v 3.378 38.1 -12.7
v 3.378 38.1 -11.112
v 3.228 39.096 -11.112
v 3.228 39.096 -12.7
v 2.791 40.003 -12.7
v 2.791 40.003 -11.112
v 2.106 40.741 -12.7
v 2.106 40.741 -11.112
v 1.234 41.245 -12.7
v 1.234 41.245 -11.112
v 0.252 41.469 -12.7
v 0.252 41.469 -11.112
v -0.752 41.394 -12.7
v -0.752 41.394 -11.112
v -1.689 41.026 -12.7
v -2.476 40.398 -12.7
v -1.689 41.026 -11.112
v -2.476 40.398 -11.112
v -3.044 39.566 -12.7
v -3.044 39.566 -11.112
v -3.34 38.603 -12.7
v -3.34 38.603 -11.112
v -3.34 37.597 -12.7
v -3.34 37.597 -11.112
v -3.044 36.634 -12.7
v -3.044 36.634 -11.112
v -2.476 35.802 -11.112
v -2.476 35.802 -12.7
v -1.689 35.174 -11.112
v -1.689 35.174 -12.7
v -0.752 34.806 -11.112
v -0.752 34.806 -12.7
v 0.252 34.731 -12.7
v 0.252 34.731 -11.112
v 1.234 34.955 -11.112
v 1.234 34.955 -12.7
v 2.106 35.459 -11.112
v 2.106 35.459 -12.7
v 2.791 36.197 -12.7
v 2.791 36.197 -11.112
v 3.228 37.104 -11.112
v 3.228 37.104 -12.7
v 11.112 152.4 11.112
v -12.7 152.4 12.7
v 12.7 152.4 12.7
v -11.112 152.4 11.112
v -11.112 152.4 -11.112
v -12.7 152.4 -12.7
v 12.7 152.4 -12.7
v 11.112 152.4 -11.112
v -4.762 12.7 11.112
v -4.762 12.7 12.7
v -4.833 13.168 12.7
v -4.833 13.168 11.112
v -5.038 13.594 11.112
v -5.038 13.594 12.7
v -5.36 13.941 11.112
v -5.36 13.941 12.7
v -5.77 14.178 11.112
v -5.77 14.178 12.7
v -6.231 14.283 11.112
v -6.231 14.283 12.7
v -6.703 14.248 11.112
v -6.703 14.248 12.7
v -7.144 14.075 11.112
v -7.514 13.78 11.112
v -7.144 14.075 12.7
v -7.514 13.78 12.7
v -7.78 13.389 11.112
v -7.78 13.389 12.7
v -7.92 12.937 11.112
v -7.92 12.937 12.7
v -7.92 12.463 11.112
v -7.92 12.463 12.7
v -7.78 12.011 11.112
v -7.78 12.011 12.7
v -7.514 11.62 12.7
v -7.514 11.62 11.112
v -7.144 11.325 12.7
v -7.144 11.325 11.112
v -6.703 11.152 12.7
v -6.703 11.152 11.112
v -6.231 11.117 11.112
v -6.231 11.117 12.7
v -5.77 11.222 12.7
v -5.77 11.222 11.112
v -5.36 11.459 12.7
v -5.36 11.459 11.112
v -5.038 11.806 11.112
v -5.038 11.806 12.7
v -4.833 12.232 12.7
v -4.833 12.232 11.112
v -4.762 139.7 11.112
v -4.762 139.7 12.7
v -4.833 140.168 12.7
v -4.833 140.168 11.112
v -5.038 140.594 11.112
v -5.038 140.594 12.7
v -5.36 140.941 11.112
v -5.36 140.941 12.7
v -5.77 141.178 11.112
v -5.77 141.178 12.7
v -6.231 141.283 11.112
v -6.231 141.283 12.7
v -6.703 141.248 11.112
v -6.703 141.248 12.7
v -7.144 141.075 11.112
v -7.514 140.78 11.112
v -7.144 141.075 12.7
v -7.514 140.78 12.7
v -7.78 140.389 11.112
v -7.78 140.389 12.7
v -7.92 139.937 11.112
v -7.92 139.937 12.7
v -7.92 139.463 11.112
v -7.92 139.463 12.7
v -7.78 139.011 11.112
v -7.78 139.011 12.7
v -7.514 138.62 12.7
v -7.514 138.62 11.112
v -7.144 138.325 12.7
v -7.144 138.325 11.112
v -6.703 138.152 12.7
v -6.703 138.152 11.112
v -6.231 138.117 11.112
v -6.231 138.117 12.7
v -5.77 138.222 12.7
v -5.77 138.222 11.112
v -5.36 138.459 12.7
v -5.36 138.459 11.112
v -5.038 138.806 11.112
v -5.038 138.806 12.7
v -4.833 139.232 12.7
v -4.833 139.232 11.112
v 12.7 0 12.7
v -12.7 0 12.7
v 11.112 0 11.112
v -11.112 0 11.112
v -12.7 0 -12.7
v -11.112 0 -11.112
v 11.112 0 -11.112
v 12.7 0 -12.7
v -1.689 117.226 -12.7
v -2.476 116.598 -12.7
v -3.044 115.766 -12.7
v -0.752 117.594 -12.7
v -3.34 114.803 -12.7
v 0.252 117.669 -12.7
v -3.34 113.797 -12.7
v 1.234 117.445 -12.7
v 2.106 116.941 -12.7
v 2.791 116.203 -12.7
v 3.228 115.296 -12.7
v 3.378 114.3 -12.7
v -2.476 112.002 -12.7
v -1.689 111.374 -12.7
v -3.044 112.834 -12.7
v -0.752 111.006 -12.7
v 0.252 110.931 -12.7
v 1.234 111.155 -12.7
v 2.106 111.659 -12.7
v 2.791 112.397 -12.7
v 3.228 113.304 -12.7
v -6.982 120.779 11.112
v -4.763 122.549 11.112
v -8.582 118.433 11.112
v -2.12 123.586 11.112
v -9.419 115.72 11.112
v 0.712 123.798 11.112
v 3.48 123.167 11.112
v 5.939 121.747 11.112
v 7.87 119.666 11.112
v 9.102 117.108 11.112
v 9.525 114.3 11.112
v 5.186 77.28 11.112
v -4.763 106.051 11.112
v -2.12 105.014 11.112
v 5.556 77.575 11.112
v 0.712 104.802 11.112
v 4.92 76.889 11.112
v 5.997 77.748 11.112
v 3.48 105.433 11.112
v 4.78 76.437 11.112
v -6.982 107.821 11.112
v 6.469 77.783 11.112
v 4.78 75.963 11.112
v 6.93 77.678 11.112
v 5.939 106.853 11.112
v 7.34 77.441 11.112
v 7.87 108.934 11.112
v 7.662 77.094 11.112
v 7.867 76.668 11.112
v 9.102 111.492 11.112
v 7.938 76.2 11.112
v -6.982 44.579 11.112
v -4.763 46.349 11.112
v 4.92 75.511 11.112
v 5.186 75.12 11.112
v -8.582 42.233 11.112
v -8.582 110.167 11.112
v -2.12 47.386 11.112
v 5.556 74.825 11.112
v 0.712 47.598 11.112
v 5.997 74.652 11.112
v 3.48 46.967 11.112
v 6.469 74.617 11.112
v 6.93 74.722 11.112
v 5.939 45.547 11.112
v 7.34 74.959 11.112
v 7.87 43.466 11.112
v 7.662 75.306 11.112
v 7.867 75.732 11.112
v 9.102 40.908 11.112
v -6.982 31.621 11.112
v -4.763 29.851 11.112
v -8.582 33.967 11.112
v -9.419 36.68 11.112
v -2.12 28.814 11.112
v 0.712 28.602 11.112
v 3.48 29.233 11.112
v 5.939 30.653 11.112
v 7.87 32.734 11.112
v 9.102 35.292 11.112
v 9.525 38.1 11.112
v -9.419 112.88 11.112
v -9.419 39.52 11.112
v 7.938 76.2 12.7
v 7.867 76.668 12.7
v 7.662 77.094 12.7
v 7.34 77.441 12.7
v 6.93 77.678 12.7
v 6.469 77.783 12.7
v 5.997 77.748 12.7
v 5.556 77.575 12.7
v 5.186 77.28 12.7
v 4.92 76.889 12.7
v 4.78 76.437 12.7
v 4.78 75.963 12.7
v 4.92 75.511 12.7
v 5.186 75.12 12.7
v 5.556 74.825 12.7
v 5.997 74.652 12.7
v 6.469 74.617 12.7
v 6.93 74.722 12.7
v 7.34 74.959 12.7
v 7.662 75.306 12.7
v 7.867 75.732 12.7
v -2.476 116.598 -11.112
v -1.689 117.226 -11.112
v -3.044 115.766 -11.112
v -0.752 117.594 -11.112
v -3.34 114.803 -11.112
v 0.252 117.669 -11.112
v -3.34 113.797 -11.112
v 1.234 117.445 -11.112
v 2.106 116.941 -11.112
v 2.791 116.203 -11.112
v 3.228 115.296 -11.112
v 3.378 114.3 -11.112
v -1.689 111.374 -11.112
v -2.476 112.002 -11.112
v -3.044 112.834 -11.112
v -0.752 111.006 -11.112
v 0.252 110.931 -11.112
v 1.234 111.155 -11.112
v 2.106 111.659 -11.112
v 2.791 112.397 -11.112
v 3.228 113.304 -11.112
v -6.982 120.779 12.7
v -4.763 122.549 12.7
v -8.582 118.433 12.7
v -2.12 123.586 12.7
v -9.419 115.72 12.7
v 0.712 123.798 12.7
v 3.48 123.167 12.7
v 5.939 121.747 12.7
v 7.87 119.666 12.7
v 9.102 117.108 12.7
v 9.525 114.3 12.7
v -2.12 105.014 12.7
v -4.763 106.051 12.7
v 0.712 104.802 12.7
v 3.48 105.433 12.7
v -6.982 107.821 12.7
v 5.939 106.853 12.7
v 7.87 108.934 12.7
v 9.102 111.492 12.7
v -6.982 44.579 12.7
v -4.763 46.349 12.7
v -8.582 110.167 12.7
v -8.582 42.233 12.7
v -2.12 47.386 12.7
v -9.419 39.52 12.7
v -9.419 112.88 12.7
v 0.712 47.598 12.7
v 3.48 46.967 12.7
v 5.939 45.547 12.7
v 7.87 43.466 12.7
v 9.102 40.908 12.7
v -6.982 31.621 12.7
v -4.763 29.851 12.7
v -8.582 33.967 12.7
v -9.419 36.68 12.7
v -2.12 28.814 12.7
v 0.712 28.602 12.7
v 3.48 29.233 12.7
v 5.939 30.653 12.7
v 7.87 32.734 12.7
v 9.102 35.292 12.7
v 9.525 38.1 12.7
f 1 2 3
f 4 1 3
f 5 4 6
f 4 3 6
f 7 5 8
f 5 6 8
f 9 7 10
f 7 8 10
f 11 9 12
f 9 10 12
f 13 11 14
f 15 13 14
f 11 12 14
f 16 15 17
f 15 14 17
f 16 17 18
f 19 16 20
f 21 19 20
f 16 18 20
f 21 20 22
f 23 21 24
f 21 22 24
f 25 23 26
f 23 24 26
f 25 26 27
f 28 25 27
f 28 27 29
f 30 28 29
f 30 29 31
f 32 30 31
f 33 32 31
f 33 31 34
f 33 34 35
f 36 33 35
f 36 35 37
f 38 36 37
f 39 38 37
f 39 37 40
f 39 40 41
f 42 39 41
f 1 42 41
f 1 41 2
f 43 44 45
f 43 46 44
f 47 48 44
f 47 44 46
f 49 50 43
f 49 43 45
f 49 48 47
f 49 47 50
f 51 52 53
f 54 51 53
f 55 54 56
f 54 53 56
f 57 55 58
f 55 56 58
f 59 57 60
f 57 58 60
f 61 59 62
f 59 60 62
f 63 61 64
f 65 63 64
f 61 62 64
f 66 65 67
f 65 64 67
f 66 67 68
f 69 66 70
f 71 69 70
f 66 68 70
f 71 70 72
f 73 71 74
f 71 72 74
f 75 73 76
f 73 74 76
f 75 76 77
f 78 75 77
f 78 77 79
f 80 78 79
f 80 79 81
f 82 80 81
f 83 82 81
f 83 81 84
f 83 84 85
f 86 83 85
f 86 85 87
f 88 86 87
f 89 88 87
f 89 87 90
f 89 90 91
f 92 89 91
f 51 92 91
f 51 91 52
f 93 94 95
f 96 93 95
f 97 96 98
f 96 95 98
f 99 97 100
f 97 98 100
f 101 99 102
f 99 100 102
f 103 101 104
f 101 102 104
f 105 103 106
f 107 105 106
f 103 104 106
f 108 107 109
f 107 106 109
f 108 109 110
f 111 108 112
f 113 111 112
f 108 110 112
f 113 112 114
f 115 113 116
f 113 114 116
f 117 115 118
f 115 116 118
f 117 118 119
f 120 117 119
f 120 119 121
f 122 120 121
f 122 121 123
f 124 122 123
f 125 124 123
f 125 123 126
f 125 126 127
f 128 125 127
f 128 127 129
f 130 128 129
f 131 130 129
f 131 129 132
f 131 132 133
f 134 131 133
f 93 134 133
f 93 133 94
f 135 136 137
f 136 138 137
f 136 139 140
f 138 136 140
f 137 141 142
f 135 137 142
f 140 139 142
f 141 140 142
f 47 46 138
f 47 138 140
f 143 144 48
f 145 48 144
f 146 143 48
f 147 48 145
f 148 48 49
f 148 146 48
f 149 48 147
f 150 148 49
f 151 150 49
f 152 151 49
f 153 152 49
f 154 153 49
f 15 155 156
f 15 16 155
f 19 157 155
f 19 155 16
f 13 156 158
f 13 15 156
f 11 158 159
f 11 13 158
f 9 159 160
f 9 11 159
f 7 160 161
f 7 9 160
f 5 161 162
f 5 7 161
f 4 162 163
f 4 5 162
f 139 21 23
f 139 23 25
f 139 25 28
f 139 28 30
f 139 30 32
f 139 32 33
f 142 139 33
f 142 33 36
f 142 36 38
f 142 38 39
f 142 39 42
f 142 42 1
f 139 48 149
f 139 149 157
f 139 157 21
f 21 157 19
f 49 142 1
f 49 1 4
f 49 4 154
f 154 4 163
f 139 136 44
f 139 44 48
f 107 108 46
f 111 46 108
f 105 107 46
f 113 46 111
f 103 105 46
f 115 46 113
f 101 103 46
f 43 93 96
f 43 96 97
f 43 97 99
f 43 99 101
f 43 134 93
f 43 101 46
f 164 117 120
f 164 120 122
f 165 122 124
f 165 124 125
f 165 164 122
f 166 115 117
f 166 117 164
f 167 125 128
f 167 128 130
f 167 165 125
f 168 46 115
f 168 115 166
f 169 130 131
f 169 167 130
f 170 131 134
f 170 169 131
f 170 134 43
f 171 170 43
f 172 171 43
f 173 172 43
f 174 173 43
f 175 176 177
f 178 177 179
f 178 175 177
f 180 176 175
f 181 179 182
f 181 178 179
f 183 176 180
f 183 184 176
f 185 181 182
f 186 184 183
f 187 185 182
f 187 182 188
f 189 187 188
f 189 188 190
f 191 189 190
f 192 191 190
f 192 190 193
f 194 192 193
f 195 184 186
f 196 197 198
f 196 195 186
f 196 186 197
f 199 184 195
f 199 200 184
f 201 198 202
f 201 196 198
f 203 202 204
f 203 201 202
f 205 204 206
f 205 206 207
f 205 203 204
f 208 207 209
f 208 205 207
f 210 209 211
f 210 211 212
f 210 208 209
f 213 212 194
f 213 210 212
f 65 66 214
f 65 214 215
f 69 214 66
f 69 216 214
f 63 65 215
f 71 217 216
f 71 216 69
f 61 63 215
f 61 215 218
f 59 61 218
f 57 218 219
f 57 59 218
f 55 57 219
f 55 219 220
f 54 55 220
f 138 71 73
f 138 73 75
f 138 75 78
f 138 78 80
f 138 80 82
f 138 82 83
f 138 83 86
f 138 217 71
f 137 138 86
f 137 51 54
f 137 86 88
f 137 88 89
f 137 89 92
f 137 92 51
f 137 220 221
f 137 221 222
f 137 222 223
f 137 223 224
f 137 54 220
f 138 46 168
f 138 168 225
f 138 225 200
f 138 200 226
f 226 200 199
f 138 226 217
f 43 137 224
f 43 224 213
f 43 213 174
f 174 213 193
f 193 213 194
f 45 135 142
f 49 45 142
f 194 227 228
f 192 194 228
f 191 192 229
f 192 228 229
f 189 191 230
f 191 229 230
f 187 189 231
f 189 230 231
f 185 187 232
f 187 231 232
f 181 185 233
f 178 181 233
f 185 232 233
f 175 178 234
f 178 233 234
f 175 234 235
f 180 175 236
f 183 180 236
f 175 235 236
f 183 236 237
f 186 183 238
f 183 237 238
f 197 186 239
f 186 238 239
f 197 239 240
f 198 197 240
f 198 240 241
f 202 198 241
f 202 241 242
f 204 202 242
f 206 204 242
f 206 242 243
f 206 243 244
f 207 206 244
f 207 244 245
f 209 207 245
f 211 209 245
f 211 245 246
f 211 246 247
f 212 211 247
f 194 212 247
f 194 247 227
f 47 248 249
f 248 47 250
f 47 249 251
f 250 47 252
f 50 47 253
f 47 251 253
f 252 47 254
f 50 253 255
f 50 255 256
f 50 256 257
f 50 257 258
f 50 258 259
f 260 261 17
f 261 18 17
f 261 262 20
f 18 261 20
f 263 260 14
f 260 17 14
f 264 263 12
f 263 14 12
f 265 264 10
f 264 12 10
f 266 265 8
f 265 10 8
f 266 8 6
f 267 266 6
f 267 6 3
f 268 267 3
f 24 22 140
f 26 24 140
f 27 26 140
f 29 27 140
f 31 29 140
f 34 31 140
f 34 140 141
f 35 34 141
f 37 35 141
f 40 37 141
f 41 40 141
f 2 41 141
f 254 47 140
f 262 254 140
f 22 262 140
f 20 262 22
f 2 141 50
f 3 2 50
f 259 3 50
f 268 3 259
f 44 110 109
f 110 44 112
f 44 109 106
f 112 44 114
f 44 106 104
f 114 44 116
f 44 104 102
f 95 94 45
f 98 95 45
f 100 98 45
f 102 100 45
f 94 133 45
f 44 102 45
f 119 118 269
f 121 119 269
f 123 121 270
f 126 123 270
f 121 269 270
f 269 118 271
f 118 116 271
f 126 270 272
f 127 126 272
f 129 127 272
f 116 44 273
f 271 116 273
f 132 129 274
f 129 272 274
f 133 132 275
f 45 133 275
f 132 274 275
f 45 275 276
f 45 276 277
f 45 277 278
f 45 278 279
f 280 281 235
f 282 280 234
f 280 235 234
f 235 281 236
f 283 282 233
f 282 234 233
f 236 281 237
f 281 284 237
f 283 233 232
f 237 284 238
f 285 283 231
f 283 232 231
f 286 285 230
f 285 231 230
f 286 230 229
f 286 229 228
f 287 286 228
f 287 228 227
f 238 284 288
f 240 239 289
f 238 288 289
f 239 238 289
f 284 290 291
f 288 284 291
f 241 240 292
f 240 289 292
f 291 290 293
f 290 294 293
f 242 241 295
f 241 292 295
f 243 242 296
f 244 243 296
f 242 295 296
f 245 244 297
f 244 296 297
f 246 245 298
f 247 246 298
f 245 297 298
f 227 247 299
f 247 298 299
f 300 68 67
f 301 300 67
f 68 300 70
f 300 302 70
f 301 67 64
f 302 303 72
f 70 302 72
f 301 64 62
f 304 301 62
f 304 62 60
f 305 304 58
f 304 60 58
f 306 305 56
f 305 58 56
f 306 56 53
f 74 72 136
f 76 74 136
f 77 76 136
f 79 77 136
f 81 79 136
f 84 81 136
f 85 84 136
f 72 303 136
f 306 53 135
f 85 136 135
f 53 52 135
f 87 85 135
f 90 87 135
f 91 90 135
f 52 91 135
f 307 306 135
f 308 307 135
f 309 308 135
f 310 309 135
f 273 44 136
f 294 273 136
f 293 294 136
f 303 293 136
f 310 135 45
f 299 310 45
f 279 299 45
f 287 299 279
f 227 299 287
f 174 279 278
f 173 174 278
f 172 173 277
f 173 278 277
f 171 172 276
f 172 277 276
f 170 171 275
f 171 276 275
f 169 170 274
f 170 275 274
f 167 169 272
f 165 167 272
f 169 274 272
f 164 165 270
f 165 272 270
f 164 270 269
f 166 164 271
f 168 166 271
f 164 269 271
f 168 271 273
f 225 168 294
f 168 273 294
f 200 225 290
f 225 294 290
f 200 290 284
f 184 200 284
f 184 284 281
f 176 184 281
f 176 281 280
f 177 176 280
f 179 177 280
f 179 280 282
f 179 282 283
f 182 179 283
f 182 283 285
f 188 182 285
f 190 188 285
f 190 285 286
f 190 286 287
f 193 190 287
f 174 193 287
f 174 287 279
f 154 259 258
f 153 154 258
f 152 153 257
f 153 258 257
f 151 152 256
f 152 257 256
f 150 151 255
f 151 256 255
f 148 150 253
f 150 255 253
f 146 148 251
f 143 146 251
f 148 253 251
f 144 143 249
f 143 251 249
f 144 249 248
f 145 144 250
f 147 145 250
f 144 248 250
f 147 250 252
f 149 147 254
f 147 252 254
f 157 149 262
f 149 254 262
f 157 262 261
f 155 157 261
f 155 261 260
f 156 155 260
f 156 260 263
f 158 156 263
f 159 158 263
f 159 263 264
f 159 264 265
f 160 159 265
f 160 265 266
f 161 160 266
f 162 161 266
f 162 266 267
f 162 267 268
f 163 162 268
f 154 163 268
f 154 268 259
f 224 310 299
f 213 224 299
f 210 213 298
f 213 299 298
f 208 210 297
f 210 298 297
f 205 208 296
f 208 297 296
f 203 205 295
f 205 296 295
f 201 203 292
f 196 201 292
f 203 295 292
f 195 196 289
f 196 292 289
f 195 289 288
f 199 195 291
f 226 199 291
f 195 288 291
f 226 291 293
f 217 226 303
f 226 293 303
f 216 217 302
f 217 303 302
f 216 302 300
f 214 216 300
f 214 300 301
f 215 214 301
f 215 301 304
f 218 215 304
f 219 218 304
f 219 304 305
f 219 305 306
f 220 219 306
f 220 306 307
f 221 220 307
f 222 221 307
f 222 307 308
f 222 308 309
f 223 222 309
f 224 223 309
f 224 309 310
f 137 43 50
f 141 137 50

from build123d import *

# Parameters (mm, degrees)
SKETCH1_W           = 25.4
SKETCH1_H           = 25.4
SKETCH1_W_2         = 22.225
SKETCH1_H_2         = 22.225
EXTRUDE_THIN1_DEPTH = 152.4
CUT_EXTRUDE1_REACH  = 27.4
SKETCH2_R           = 9.525
SKETCH2_R_2         = 1.5875
SKETCH4_R           = 3.3782
CUT_EXTRUDE2_DEPTH  = 2.5875


with BuildPart() as part:
    # Sketch1 → Extrude-Thin1 (new body)
    with BuildSketch(Plane(origin=(0, 0, 0), x_dir=(1, 0, 0), z_dir=(0, 1, 0))):
        Rectangle(SKETCH1_W, SKETCH1_H)
        Rectangle(SKETCH1_W_2, SKETCH1_H_2, mode=Mode.SUBTRACT)
    extrude(amount=EXTRUDE_THIN1_DEPTH)

    # Sketch2 → Cut-Extrude1 (cut, up to next)
    with BuildSketch(Plane.XY.offset(12.7), mode=Mode.PRIVATE) as cut_extrude1_sk1:
        with Locations((0, 114.3)):
            Circle(SKETCH2_R)
    cut_extrude1_tool1 = extrude(cut_extrude1_sk1.sketch, amount=-CUT_EXTRUDE1_REACH, mode=Mode.PRIVATE) & part.part
    add(cut_extrude1_tool1.solids().sort_by_distance((0, 114.3, 12.7))[0], mode=Mode.SUBTRACT)
    # Sketch2 → Cut-Extrude1 (cut, up to next)
    with BuildSketch(Plane.XY.offset(12.7), mode=Mode.PRIVATE) as cut_extrude1_sk2:
        with Locations((0, 38.1)):
            Circle(SKETCH2_R)
    cut_extrude1_tool2 = extrude(cut_extrude1_sk2.sketch, amount=-CUT_EXTRUDE1_REACH, mode=Mode.PRIVATE) & part.part
    add(cut_extrude1_tool2.solids().sort_by_distance((0, 38.1, 12.7))[0], mode=Mode.SUBTRACT)
    # Sketch2 → Cut-Extrude1 (cut, up to next)
    with BuildSketch(Plane.XY.offset(12.7), mode=Mode.PRIVATE) as cut_extrude1_sk3:
        with Locations((-6.35, 139.7)):
            Circle(SKETCH2_R_2)
    cut_extrude1_tool3 = extrude(cut_extrude1_sk3.sketch, amount=-CUT_EXTRUDE1_REACH, mode=Mode.PRIVATE) & part.part
    add(cut_extrude1_tool3.solids().sort_by_distance((-6.35, 139.7, 12.7))[0], mode=Mode.SUBTRACT)
    # Sketch2 → Cut-Extrude1 (cut, up to next)
    with BuildSketch(Plane.XY.offset(12.7), mode=Mode.PRIVATE) as cut_extrude1_sk4:
        with Locations((6.35, 76.2)):
            Circle(SKETCH2_R_2)
    cut_extrude1_tool4 = extrude(cut_extrude1_sk4.sketch, amount=-CUT_EXTRUDE1_REACH, mode=Mode.PRIVATE) & part.part
    add(cut_extrude1_tool4.solids().sort_by_distance((6.35, 76.2, 12.7))[0], mode=Mode.SUBTRACT)
    # Sketch2 → Cut-Extrude1 (cut, up to next)
    with BuildSketch(Plane.XY.offset(12.7), mode=Mode.PRIVATE) as cut_extrude1_sk5:
        with Locations((-6.35, 12.7)):
            Circle(SKETCH2_R_2)
    cut_extrude1_tool5 = extrude(cut_extrude1_sk5.sketch, amount=-CUT_EXTRUDE1_REACH, mode=Mode.PRIVATE) & part.part
    add(cut_extrude1_tool5.solids().sort_by_distance((-6.35, 12.7, 12.7))[0], mode=Mode.SUBTRACT)

    # Sketch4 → Cut-Extrude2 (cut, through all)
    with BuildSketch(Plane.XY.offset(-11.1125)):
        with Locations((0, 114.3)):
            Circle(SKETCH4_R)
        with Locations((0, 38.1)):
            Circle(SKETCH4_R)
    extrude(amount=-CUT_EXTRUDE2_DEPTH, mode=Mode.SUBTRACT)


solid = part.part
